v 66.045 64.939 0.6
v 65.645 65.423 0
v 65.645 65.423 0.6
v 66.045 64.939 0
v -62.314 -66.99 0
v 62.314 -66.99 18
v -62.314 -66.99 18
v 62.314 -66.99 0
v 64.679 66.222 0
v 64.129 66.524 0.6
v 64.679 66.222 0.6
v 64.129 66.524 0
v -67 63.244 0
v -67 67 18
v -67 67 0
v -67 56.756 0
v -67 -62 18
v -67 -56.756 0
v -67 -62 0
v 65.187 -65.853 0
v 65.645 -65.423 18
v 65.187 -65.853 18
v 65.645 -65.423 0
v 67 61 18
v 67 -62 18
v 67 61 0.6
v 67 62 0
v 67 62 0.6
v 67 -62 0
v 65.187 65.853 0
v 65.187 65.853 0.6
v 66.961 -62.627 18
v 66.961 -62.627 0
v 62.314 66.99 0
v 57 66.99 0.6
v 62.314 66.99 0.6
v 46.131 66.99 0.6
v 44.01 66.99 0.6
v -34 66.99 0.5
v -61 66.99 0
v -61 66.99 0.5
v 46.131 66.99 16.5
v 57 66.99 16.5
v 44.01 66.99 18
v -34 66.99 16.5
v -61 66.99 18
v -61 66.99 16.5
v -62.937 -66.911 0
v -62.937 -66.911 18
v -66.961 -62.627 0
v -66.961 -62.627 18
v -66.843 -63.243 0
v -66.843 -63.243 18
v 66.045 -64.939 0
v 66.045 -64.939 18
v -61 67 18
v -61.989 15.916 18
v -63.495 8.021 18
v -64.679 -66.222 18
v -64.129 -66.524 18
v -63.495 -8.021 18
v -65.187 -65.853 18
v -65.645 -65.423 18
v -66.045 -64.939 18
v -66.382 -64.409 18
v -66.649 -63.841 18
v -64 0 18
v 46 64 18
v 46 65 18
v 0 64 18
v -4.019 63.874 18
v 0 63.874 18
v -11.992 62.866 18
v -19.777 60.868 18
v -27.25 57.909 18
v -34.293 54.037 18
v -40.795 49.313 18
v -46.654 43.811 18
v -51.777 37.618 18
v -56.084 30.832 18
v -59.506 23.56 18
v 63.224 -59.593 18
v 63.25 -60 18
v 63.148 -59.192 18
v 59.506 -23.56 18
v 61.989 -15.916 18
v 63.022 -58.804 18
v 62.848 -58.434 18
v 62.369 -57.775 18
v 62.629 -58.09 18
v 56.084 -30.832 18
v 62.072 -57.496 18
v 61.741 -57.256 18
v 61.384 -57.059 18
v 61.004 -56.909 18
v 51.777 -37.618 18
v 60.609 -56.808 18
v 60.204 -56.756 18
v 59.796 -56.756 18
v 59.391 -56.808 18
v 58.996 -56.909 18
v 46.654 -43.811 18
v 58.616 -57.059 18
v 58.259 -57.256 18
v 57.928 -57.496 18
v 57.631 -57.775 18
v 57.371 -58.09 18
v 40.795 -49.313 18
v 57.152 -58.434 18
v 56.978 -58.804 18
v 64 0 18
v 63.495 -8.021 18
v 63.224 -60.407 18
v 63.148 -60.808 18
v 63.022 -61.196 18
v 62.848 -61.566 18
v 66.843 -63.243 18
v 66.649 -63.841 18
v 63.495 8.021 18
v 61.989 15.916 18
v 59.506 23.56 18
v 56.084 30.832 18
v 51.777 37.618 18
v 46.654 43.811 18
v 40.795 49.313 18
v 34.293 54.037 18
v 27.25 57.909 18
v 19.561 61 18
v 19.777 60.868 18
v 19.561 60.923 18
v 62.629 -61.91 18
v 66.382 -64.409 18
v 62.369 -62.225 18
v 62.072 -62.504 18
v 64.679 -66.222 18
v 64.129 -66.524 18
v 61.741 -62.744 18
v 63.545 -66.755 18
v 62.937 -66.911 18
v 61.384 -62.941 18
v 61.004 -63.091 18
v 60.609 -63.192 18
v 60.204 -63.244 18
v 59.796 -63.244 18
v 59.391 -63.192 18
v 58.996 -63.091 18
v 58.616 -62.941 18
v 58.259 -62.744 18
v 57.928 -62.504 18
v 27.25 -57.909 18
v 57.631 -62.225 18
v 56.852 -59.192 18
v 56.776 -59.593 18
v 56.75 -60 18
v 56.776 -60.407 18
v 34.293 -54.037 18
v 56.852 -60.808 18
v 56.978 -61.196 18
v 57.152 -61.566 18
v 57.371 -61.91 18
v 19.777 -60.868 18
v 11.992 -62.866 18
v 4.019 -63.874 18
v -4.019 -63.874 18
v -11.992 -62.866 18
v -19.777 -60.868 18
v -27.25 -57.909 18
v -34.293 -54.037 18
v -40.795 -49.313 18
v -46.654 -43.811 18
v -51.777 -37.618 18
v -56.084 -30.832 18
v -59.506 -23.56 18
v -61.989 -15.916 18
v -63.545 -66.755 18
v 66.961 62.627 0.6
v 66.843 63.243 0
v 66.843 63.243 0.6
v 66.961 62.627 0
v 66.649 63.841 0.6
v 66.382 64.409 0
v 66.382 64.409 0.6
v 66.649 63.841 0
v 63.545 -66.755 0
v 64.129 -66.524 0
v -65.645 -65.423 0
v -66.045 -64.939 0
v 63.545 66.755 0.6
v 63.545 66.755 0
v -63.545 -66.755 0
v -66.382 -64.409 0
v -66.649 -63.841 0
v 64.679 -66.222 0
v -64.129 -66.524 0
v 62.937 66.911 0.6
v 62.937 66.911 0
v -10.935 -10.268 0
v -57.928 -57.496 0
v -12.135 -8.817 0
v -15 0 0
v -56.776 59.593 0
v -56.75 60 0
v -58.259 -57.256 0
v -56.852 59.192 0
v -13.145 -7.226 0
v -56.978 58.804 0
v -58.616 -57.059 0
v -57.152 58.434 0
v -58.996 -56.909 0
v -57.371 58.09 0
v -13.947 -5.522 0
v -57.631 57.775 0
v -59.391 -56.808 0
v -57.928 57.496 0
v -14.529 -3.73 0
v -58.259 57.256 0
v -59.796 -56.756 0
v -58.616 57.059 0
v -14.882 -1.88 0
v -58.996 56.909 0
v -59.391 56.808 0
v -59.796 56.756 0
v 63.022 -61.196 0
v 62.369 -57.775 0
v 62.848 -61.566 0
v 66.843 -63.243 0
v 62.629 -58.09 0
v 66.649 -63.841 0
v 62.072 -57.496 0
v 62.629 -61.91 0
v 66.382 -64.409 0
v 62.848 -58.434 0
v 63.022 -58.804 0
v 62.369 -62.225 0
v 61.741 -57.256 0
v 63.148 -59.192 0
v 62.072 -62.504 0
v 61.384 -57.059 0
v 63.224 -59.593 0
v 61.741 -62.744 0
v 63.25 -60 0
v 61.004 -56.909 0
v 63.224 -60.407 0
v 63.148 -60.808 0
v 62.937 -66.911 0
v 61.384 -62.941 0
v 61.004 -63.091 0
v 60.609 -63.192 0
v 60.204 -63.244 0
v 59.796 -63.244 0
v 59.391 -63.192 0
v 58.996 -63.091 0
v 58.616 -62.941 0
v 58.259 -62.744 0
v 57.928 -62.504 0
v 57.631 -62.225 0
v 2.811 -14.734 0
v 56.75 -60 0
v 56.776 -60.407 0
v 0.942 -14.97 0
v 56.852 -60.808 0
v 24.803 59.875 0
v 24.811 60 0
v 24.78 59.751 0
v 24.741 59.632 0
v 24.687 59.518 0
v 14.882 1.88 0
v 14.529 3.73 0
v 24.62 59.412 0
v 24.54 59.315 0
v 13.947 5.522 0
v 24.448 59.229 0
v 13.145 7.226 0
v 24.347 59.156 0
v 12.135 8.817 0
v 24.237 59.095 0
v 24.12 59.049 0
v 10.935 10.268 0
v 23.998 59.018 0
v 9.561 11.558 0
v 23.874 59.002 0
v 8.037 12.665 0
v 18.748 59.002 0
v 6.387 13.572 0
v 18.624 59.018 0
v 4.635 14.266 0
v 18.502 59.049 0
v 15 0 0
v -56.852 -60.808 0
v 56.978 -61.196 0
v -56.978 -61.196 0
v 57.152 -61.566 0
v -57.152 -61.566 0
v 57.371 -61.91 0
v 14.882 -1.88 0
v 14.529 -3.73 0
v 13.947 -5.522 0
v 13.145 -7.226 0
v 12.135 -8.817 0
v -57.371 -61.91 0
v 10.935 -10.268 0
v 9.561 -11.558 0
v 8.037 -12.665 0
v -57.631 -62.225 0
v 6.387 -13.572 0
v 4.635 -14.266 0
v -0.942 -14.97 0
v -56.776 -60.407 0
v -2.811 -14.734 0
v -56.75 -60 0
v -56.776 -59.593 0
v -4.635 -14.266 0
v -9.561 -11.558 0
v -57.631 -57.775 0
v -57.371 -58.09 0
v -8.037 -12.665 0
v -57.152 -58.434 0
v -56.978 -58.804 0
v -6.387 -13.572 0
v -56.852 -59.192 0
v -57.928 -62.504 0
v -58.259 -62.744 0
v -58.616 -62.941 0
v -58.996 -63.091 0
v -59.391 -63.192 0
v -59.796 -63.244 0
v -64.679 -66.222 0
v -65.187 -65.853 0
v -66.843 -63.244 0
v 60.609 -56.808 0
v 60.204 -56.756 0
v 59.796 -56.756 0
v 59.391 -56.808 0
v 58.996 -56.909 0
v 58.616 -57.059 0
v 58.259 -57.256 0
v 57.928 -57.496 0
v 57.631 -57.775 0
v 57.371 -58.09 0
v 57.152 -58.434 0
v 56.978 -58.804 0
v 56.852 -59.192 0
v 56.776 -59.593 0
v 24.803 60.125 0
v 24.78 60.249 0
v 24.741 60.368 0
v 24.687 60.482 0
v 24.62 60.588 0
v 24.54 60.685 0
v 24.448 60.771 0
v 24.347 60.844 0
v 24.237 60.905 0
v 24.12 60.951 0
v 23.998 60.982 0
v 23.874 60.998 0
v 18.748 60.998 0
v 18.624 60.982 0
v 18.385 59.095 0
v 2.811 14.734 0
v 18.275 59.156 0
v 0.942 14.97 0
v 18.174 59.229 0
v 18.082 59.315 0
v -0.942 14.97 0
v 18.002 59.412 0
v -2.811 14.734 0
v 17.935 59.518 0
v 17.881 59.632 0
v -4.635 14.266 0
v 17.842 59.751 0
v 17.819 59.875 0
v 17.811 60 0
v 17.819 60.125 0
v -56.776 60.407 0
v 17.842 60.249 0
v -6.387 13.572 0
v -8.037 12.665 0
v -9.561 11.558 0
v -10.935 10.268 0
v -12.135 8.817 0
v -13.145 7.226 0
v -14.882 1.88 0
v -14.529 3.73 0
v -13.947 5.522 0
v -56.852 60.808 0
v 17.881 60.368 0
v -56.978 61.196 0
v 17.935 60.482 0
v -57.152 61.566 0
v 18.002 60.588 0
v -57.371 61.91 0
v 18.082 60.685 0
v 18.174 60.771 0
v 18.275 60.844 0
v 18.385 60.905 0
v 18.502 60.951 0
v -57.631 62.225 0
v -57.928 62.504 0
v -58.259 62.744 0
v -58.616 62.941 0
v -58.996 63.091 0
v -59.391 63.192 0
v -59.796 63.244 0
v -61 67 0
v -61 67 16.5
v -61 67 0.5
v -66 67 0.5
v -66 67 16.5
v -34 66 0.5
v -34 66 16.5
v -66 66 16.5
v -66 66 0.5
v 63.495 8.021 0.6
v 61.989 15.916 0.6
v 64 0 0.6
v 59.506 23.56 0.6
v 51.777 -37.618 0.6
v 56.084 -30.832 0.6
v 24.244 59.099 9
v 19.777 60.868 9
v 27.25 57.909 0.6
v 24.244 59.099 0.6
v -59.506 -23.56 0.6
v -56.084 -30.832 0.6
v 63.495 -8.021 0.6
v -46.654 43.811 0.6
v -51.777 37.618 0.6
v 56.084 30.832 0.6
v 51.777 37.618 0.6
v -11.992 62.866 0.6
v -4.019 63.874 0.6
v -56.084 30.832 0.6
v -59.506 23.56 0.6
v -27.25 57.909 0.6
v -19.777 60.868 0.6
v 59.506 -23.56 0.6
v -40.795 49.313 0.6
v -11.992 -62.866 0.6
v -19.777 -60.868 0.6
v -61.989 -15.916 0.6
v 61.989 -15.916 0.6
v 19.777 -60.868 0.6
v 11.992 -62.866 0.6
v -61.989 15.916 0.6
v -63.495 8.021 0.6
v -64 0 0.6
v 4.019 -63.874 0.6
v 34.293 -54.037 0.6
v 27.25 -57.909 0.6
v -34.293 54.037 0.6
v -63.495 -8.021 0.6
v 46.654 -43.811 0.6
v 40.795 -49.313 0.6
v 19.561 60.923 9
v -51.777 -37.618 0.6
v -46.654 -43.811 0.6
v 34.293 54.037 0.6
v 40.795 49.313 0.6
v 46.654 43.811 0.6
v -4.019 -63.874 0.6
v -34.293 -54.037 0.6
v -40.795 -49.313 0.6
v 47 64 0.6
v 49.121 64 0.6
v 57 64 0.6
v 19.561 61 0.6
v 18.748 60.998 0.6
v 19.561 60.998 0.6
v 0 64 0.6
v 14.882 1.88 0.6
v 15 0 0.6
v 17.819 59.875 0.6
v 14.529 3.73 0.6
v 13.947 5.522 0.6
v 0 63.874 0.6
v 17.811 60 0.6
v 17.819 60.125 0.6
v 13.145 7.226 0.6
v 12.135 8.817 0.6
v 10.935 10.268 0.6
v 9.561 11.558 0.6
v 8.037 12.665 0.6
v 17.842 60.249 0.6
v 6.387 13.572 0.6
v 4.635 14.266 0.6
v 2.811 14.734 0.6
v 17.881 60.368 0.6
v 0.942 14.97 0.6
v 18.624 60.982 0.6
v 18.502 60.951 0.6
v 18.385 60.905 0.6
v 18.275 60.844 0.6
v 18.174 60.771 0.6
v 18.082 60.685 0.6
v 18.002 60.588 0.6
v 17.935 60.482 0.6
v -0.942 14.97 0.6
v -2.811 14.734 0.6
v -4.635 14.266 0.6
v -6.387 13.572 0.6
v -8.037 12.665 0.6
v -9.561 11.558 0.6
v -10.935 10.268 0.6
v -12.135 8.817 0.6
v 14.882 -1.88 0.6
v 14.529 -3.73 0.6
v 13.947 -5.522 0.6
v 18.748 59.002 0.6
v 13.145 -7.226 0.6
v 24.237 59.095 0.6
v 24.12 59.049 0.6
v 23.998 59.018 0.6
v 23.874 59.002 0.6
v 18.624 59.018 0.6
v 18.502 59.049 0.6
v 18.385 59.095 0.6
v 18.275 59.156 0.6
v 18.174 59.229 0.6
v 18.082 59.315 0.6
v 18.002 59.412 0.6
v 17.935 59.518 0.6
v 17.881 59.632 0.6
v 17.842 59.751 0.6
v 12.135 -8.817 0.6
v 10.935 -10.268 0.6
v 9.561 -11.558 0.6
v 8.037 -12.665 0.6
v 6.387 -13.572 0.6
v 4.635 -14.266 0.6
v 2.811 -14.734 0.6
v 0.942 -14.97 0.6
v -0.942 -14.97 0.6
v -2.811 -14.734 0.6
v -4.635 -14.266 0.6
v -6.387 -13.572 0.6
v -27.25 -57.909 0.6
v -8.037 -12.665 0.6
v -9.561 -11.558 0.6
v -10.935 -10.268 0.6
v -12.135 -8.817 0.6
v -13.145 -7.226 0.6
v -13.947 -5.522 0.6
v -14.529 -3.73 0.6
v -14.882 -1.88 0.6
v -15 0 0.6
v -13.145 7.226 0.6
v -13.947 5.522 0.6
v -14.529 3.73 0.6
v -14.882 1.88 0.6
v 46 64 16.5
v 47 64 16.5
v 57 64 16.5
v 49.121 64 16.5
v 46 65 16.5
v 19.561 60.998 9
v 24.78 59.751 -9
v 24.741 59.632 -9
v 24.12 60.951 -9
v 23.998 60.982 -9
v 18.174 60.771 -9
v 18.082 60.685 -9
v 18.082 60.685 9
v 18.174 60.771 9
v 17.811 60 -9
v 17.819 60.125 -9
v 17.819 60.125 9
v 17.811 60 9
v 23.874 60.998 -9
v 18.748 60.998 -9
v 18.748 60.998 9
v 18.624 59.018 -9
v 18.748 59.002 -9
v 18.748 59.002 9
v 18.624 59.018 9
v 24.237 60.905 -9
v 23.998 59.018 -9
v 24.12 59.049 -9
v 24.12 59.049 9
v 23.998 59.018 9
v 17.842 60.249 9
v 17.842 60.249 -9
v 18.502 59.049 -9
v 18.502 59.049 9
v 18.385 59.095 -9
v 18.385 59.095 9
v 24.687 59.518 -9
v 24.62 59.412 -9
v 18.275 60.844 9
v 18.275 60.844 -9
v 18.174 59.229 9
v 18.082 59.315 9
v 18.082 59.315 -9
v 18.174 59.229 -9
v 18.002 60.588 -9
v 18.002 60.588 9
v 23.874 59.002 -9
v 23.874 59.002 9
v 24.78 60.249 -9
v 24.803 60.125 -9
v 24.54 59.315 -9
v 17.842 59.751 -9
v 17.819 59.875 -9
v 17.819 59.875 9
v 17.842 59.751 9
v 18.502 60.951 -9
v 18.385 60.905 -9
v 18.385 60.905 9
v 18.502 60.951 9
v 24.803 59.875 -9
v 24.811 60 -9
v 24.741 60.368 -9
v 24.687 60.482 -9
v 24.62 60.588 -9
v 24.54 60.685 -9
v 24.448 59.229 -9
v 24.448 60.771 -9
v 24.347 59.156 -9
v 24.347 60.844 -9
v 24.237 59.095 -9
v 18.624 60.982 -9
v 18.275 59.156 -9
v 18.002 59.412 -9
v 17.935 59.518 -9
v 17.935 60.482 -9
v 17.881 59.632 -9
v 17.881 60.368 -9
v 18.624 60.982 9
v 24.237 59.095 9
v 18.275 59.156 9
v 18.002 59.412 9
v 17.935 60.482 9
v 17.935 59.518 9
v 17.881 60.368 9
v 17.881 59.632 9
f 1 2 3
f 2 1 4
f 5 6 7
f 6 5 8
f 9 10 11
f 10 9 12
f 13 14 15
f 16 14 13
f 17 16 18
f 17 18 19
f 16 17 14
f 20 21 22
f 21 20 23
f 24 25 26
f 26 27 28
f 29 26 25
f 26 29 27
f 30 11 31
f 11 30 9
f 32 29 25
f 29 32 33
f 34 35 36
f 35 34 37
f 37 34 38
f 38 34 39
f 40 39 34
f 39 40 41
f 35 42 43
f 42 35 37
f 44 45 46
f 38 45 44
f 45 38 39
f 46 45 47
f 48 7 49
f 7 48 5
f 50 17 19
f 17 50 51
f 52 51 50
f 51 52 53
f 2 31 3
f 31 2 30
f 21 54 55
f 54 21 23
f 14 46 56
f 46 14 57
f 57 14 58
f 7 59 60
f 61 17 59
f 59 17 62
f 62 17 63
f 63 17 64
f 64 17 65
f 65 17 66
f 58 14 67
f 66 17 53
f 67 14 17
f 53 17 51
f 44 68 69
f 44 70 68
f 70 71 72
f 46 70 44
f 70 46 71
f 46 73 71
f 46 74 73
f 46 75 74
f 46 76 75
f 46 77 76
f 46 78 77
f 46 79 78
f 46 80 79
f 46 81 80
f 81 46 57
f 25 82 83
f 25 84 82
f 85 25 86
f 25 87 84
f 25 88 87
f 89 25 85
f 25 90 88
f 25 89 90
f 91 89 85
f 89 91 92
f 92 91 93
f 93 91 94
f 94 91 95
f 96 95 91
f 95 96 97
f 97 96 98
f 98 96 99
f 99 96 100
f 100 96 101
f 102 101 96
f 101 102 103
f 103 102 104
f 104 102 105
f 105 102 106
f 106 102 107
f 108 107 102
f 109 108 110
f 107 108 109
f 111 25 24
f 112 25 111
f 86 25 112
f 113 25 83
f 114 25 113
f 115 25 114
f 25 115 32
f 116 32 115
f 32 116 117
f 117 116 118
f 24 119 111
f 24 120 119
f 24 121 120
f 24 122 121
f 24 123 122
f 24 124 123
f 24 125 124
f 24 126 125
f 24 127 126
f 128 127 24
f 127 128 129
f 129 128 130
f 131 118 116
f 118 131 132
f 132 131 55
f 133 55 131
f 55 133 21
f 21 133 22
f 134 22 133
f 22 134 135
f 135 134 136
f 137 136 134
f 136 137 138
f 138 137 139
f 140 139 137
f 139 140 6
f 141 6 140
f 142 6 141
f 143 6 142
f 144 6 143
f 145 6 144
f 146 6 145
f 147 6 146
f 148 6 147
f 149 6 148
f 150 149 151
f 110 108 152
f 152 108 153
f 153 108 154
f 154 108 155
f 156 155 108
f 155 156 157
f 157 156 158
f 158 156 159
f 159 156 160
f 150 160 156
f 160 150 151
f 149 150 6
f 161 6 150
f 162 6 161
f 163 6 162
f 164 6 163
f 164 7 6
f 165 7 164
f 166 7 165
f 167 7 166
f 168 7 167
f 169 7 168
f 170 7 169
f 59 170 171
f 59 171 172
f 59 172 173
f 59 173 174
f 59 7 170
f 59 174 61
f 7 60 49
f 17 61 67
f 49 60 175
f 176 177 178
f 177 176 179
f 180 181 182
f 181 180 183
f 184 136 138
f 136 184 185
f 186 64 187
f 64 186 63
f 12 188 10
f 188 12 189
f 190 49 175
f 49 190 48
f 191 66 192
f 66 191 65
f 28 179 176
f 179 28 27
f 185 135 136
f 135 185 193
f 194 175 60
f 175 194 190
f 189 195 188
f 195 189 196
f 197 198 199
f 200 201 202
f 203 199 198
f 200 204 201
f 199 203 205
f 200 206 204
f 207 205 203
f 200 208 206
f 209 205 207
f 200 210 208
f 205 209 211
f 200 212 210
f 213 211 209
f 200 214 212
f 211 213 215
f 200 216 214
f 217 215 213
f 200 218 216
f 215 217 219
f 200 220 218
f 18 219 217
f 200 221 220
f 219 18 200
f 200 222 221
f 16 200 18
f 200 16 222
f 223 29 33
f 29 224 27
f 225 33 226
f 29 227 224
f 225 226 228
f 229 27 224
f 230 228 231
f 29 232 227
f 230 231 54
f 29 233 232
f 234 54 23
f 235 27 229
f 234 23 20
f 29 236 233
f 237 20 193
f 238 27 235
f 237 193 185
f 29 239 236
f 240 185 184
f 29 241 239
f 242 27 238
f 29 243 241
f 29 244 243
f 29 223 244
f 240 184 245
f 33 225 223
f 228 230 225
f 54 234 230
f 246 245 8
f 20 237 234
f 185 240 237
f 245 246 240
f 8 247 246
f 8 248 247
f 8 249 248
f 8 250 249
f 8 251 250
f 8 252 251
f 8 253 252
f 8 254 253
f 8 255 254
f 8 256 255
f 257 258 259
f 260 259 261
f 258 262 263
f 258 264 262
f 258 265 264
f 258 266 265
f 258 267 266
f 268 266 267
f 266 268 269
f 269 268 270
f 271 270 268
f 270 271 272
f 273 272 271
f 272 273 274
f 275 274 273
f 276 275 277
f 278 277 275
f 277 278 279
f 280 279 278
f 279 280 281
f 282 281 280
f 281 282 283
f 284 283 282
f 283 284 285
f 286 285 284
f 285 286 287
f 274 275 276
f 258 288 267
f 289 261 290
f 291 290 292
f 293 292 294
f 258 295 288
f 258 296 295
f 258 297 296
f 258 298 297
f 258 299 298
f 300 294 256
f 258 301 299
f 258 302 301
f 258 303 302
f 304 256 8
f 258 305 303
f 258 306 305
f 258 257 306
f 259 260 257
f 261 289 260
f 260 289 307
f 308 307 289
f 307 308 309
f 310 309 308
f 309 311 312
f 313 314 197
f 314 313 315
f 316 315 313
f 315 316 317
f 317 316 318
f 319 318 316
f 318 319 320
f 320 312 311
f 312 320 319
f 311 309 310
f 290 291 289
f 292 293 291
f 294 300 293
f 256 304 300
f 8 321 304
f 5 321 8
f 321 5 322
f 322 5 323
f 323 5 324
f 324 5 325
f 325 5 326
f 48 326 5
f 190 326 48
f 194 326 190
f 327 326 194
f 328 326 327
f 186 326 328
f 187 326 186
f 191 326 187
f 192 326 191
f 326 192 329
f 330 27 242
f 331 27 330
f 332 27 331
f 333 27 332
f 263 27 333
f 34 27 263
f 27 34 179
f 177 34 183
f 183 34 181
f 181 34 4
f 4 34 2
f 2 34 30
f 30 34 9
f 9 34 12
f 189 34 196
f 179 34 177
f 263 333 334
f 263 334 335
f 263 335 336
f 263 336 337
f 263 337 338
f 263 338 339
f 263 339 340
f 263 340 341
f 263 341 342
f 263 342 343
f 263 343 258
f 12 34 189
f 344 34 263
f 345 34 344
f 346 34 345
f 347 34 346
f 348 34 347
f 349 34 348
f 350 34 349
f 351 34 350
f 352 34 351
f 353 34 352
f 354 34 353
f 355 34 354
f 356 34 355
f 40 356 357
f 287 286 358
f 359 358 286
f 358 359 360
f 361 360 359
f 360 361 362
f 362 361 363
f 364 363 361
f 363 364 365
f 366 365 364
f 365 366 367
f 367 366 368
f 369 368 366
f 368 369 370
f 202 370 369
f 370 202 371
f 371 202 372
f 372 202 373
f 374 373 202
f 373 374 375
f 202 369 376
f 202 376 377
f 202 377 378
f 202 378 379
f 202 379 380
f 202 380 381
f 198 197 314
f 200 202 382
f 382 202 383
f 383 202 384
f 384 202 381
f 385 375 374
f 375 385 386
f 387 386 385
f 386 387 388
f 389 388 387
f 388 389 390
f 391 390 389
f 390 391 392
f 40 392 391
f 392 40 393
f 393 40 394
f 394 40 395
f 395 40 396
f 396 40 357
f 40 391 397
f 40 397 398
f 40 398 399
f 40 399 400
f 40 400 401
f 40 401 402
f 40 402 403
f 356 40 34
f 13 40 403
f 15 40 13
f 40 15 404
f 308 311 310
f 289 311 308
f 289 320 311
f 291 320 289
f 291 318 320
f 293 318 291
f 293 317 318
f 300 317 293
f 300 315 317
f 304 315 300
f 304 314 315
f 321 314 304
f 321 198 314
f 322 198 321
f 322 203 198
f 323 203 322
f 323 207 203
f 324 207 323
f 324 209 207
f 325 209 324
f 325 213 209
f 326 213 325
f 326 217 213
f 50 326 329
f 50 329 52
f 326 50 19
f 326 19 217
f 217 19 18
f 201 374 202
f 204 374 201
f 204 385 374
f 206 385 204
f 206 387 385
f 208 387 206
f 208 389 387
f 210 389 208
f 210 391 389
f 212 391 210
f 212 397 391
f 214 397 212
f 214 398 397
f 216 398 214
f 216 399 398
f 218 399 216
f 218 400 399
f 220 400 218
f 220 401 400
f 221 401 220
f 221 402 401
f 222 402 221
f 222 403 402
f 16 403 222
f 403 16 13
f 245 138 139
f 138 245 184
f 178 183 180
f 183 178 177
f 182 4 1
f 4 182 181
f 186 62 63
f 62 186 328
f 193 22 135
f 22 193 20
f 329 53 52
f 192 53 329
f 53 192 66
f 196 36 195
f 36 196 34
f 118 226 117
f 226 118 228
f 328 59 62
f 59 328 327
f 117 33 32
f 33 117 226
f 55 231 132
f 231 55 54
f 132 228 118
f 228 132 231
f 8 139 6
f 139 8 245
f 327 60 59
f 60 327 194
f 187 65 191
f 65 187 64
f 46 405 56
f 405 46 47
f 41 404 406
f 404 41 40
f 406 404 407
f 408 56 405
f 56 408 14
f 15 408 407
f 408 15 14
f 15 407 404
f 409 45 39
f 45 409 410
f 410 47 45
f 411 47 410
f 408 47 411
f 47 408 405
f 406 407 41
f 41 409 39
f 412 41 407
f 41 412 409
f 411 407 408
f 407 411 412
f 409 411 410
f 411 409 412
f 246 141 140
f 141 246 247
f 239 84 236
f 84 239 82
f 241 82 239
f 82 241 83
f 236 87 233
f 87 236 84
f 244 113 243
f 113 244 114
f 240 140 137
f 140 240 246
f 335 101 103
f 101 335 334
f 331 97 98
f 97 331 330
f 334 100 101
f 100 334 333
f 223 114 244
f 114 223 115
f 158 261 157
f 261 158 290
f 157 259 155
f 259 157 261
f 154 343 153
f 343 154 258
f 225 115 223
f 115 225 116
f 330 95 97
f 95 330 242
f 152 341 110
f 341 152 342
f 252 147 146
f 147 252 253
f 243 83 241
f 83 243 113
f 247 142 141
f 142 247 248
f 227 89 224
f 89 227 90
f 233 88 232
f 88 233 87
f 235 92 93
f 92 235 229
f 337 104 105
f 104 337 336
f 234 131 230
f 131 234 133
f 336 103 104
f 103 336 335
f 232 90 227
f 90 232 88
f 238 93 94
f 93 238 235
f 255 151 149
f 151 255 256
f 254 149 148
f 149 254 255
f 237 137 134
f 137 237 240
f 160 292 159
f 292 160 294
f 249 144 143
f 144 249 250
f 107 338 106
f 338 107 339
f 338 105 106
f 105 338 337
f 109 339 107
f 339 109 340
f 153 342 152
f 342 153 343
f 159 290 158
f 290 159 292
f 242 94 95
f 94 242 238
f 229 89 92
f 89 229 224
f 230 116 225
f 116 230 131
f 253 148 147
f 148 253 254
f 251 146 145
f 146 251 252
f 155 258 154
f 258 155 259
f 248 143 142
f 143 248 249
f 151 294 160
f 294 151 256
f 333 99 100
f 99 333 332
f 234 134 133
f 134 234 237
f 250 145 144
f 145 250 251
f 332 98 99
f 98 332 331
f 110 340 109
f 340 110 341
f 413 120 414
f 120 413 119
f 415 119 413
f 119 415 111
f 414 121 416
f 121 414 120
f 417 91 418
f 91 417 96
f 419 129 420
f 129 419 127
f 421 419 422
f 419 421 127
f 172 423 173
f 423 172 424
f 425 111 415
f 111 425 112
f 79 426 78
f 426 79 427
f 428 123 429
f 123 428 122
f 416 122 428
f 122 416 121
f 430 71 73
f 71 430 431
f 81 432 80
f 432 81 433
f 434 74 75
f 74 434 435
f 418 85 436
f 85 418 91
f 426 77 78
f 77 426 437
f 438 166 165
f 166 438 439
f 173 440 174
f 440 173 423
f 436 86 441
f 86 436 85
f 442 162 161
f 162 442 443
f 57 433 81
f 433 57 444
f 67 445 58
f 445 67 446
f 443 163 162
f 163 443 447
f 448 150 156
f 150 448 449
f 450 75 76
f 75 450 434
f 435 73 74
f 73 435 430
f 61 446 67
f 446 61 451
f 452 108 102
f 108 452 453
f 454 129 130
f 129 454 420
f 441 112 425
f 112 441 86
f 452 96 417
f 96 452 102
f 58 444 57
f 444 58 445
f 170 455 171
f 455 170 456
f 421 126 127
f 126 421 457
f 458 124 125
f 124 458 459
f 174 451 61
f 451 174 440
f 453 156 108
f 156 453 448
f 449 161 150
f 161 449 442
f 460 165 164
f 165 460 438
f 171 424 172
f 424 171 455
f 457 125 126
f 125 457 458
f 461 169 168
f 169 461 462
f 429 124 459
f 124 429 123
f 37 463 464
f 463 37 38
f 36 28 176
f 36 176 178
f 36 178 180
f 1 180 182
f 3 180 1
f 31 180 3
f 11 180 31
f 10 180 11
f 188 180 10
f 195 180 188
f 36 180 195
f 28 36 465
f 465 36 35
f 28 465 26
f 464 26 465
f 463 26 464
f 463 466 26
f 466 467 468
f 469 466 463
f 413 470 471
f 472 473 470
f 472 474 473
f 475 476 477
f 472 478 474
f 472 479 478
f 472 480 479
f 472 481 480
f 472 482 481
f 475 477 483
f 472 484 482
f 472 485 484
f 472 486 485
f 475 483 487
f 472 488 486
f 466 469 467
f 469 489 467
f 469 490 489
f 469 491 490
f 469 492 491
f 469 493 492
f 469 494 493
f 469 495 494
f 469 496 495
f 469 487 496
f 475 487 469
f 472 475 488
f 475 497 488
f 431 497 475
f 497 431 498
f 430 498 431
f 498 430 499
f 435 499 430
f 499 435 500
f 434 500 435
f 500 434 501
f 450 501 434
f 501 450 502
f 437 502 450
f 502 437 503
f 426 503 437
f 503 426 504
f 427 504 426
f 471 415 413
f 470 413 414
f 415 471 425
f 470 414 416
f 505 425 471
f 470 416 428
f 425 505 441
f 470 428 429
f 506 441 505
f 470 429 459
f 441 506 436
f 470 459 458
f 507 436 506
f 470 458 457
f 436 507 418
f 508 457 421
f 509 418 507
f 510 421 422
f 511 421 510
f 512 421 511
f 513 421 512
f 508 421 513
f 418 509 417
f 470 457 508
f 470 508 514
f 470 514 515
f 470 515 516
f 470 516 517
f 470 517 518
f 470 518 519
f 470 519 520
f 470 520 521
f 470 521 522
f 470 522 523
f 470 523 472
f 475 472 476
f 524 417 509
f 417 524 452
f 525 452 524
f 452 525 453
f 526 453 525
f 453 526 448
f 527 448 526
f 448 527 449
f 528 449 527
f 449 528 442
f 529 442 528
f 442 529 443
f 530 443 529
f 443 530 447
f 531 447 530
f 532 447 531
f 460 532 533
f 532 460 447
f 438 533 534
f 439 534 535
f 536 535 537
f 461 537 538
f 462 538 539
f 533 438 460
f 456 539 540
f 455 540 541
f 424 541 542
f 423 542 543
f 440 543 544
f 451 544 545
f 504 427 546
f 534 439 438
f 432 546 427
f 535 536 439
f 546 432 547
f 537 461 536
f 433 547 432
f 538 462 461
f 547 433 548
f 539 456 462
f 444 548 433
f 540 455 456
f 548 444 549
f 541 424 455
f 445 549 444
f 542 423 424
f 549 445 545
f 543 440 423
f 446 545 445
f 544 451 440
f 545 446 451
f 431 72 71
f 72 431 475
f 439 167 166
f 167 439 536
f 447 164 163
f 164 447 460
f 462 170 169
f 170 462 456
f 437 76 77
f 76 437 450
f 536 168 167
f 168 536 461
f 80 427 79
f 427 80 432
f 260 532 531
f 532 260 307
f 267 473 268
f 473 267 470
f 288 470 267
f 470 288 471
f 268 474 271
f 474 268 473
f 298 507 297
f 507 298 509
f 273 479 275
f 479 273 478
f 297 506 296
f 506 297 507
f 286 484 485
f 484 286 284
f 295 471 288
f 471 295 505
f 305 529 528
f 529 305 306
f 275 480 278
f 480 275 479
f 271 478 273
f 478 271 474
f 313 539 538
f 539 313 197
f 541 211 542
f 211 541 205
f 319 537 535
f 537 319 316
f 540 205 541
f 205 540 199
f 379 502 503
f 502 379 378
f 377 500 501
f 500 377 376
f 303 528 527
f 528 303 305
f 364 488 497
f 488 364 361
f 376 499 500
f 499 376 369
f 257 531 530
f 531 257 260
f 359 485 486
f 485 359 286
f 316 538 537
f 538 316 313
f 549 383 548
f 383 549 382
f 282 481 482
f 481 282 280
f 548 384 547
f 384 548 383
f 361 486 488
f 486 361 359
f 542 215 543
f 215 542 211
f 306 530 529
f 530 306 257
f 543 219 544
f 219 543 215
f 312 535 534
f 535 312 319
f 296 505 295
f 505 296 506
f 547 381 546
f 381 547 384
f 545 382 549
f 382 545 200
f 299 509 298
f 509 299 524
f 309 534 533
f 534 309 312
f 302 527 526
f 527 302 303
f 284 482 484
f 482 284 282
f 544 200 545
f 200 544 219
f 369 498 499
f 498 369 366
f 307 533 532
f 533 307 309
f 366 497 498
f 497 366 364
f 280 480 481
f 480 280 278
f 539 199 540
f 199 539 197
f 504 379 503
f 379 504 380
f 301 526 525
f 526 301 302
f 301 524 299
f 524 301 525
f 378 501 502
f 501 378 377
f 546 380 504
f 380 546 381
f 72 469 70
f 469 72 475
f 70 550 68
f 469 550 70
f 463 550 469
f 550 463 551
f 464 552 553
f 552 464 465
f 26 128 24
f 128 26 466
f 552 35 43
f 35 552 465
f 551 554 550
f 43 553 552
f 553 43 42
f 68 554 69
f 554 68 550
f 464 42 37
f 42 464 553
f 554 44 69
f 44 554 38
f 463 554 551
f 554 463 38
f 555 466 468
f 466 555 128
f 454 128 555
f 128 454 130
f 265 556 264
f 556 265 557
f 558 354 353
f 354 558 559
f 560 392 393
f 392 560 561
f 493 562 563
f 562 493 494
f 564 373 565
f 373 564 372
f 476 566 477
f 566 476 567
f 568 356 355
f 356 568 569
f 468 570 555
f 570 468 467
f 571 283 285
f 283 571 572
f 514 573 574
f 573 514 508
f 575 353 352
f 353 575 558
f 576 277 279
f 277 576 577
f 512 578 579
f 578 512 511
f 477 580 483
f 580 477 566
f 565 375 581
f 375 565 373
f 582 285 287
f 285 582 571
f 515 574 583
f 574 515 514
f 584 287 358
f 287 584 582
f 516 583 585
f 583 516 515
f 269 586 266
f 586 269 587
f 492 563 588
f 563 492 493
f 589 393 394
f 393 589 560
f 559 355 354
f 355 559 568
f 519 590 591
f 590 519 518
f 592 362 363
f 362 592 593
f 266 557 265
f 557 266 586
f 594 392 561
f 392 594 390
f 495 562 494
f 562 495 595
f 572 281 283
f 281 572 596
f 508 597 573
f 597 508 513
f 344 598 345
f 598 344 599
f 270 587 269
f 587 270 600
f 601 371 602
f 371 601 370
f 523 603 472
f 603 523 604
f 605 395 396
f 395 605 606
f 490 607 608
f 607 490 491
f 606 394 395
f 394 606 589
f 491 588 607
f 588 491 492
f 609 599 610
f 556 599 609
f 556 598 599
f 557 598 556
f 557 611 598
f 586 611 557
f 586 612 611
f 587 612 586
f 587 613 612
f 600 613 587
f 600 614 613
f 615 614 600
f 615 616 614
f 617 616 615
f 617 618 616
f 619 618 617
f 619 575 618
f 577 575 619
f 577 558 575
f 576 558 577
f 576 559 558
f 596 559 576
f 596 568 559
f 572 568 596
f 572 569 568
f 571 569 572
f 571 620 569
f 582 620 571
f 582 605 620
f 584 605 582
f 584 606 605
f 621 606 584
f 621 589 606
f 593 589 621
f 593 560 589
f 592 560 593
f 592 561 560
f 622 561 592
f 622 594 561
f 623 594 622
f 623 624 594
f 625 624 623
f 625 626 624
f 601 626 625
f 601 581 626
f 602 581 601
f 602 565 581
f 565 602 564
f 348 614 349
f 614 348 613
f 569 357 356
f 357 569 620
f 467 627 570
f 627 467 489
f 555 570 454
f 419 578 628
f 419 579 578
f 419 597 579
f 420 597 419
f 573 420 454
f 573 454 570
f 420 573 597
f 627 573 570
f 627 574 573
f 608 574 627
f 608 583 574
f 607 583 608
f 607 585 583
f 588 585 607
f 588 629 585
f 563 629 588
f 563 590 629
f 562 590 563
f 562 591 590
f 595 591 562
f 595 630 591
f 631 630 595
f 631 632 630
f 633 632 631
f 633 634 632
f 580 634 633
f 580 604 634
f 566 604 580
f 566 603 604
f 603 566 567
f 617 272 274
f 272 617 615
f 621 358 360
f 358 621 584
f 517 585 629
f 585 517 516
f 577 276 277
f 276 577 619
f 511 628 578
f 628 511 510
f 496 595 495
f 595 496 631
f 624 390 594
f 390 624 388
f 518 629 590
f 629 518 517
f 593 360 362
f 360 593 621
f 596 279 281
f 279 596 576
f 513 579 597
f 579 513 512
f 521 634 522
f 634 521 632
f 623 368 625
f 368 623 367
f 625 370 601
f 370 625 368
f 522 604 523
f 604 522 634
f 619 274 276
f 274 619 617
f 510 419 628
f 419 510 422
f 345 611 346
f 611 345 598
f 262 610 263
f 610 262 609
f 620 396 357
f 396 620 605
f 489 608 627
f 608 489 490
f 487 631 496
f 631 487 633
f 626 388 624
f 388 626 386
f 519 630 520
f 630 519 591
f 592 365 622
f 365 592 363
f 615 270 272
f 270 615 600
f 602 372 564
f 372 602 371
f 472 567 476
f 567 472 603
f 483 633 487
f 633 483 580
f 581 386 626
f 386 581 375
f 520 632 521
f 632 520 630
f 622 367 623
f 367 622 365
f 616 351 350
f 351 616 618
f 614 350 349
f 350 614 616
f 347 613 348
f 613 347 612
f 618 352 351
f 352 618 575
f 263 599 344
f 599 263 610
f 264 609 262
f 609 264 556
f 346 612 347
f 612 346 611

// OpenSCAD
$fn = 50;


union() {
	difference() {
		union() {
			hull() {
				translate(v = [-62.0000000000, 62.0000000000, 0]) {
					cylinder(h = 18, r = 5);
				}
				translate(v = [62.0000000000, 62.0000000000, 0]) {
					cylinder(h = 18, r = 5);
				}
				translate(v = [-62.0000000000, -62.0000000000, 0]) {
					cylinder(h = 18, r = 5);
				}
				translate(v = [62.0000000000, -62.0000000000, 0]) {
					cylinder(h = 18, r = 5);
				}
			}
			translate(v = [-67.0000000000, 61.0000000000, 0]) {
				cube(size = [6, 6, 18]);
			}
		}
		union() {
			translate(v = [-67.5000000000, -60.0000000000, -250.0000000000]) {
				rotate(a = [0, 0, 0]) {
					difference() {
						union() {
							hull() {
								translate(v = [7.5000000000, 0, 0]) {
									cylinder(h = 250, r = 3.2500000000, r1 = 3.2500000000, r2 = 3.2500000000);
								}
								translate(v = [-7.5000000000, 0, 0]) {
									cylinder(h = 250, r = 3.2500000000, r1 = 3.2500000000, r2 = 3.2500000000);
								}
							}
						}
						union();
					}
				}
			}
			translate(v = [-67.5000000000, 60.0000000000, -250.0000000000]) {
				rotate(a = [0, 0, 0]) {
					difference() {
						union() {
							hull() {
								translate(v = [7.5000000000, 0, 0]) {
									cylinder(h = 250, r = 3.2500000000, r1 = 3.2500000000, r2 = 3.2500000000);
								}
								translate(v = [-7.5000000000, 0, 0]) {
									cylinder(h = 250, r = 3.2500000000, r1 = 3.2500000000, r2 = 3.2500000000);
								}
							}
						}
						union();
					}
				}
			}
			translate(v = [-66.0000000000, 66.0000000000, 0.5000000000]) {
				cube(size = [32, 1, 16]);
			}
			translate(v = [60.0000000000, -60.0000000000, 0]) {
				cylinder(h = 100, r = 3.2500000000);
			}
			translate(v = [0, 0, 0.6000000000]) {
				cylinder(h = 20.4000000000, r = 64.0000000000);
			}
			translate(v = [0, 0, -9.0000000000]) {
				cylinder(h = 18, r = 15.0000000000);
			}
			translate(v = [0.0000000000, 61.0000000000, 0.6000000000]) {
				cube(size = [67.0000000000, 3, 20.4000000000]);
			}
			translate(v = [57.0000000000, 61.0000000000, 0.6000000000]) {
				cube(size = [10, 6, 20.4000000000]);
			}
			translate(v = [46.0000000000, 61.0000000000, 16.5000000000]) {
				cube(size = [21, 6, 1.5000000000]);
			}
			translate(v = [43.2500000000, 67.7500000000, 0.6000000000]) {
				rotate(a = [0, 0, -45]) {
					cube(size = [7.5000000000, 1.5000000000, 20.4000000000]);
				}
			}
			translate(v = [12.0610000000, 59.0000000000, 0.6000000000]) {
				cube(size = [7.5000000000, 2, 17.4000000000]);
			}
		}
	}
	union() {
		translate(v = [21.3110000000, 60.0000000000, -9.0000000000]) {
			rotate(a = [0, 0, 0]) {
				difference() {
					union() {
						#hull() {
							#translate(v = [2.5000000000, 0, 0]) {
								cylinder(h = 18, r = 1.0000000000, r1 = 1.0000000000, r2 = 1.0000000000);
							}
							#translate(v = [-2.5000000000, 0, 0]) {
								cylinder(h = 18, r = 1.0000000000, r1 = 1.0000000000, r2 = 1.0000000000);
							}
						}
					}
					union();
				}
			}
		}
	}
}
